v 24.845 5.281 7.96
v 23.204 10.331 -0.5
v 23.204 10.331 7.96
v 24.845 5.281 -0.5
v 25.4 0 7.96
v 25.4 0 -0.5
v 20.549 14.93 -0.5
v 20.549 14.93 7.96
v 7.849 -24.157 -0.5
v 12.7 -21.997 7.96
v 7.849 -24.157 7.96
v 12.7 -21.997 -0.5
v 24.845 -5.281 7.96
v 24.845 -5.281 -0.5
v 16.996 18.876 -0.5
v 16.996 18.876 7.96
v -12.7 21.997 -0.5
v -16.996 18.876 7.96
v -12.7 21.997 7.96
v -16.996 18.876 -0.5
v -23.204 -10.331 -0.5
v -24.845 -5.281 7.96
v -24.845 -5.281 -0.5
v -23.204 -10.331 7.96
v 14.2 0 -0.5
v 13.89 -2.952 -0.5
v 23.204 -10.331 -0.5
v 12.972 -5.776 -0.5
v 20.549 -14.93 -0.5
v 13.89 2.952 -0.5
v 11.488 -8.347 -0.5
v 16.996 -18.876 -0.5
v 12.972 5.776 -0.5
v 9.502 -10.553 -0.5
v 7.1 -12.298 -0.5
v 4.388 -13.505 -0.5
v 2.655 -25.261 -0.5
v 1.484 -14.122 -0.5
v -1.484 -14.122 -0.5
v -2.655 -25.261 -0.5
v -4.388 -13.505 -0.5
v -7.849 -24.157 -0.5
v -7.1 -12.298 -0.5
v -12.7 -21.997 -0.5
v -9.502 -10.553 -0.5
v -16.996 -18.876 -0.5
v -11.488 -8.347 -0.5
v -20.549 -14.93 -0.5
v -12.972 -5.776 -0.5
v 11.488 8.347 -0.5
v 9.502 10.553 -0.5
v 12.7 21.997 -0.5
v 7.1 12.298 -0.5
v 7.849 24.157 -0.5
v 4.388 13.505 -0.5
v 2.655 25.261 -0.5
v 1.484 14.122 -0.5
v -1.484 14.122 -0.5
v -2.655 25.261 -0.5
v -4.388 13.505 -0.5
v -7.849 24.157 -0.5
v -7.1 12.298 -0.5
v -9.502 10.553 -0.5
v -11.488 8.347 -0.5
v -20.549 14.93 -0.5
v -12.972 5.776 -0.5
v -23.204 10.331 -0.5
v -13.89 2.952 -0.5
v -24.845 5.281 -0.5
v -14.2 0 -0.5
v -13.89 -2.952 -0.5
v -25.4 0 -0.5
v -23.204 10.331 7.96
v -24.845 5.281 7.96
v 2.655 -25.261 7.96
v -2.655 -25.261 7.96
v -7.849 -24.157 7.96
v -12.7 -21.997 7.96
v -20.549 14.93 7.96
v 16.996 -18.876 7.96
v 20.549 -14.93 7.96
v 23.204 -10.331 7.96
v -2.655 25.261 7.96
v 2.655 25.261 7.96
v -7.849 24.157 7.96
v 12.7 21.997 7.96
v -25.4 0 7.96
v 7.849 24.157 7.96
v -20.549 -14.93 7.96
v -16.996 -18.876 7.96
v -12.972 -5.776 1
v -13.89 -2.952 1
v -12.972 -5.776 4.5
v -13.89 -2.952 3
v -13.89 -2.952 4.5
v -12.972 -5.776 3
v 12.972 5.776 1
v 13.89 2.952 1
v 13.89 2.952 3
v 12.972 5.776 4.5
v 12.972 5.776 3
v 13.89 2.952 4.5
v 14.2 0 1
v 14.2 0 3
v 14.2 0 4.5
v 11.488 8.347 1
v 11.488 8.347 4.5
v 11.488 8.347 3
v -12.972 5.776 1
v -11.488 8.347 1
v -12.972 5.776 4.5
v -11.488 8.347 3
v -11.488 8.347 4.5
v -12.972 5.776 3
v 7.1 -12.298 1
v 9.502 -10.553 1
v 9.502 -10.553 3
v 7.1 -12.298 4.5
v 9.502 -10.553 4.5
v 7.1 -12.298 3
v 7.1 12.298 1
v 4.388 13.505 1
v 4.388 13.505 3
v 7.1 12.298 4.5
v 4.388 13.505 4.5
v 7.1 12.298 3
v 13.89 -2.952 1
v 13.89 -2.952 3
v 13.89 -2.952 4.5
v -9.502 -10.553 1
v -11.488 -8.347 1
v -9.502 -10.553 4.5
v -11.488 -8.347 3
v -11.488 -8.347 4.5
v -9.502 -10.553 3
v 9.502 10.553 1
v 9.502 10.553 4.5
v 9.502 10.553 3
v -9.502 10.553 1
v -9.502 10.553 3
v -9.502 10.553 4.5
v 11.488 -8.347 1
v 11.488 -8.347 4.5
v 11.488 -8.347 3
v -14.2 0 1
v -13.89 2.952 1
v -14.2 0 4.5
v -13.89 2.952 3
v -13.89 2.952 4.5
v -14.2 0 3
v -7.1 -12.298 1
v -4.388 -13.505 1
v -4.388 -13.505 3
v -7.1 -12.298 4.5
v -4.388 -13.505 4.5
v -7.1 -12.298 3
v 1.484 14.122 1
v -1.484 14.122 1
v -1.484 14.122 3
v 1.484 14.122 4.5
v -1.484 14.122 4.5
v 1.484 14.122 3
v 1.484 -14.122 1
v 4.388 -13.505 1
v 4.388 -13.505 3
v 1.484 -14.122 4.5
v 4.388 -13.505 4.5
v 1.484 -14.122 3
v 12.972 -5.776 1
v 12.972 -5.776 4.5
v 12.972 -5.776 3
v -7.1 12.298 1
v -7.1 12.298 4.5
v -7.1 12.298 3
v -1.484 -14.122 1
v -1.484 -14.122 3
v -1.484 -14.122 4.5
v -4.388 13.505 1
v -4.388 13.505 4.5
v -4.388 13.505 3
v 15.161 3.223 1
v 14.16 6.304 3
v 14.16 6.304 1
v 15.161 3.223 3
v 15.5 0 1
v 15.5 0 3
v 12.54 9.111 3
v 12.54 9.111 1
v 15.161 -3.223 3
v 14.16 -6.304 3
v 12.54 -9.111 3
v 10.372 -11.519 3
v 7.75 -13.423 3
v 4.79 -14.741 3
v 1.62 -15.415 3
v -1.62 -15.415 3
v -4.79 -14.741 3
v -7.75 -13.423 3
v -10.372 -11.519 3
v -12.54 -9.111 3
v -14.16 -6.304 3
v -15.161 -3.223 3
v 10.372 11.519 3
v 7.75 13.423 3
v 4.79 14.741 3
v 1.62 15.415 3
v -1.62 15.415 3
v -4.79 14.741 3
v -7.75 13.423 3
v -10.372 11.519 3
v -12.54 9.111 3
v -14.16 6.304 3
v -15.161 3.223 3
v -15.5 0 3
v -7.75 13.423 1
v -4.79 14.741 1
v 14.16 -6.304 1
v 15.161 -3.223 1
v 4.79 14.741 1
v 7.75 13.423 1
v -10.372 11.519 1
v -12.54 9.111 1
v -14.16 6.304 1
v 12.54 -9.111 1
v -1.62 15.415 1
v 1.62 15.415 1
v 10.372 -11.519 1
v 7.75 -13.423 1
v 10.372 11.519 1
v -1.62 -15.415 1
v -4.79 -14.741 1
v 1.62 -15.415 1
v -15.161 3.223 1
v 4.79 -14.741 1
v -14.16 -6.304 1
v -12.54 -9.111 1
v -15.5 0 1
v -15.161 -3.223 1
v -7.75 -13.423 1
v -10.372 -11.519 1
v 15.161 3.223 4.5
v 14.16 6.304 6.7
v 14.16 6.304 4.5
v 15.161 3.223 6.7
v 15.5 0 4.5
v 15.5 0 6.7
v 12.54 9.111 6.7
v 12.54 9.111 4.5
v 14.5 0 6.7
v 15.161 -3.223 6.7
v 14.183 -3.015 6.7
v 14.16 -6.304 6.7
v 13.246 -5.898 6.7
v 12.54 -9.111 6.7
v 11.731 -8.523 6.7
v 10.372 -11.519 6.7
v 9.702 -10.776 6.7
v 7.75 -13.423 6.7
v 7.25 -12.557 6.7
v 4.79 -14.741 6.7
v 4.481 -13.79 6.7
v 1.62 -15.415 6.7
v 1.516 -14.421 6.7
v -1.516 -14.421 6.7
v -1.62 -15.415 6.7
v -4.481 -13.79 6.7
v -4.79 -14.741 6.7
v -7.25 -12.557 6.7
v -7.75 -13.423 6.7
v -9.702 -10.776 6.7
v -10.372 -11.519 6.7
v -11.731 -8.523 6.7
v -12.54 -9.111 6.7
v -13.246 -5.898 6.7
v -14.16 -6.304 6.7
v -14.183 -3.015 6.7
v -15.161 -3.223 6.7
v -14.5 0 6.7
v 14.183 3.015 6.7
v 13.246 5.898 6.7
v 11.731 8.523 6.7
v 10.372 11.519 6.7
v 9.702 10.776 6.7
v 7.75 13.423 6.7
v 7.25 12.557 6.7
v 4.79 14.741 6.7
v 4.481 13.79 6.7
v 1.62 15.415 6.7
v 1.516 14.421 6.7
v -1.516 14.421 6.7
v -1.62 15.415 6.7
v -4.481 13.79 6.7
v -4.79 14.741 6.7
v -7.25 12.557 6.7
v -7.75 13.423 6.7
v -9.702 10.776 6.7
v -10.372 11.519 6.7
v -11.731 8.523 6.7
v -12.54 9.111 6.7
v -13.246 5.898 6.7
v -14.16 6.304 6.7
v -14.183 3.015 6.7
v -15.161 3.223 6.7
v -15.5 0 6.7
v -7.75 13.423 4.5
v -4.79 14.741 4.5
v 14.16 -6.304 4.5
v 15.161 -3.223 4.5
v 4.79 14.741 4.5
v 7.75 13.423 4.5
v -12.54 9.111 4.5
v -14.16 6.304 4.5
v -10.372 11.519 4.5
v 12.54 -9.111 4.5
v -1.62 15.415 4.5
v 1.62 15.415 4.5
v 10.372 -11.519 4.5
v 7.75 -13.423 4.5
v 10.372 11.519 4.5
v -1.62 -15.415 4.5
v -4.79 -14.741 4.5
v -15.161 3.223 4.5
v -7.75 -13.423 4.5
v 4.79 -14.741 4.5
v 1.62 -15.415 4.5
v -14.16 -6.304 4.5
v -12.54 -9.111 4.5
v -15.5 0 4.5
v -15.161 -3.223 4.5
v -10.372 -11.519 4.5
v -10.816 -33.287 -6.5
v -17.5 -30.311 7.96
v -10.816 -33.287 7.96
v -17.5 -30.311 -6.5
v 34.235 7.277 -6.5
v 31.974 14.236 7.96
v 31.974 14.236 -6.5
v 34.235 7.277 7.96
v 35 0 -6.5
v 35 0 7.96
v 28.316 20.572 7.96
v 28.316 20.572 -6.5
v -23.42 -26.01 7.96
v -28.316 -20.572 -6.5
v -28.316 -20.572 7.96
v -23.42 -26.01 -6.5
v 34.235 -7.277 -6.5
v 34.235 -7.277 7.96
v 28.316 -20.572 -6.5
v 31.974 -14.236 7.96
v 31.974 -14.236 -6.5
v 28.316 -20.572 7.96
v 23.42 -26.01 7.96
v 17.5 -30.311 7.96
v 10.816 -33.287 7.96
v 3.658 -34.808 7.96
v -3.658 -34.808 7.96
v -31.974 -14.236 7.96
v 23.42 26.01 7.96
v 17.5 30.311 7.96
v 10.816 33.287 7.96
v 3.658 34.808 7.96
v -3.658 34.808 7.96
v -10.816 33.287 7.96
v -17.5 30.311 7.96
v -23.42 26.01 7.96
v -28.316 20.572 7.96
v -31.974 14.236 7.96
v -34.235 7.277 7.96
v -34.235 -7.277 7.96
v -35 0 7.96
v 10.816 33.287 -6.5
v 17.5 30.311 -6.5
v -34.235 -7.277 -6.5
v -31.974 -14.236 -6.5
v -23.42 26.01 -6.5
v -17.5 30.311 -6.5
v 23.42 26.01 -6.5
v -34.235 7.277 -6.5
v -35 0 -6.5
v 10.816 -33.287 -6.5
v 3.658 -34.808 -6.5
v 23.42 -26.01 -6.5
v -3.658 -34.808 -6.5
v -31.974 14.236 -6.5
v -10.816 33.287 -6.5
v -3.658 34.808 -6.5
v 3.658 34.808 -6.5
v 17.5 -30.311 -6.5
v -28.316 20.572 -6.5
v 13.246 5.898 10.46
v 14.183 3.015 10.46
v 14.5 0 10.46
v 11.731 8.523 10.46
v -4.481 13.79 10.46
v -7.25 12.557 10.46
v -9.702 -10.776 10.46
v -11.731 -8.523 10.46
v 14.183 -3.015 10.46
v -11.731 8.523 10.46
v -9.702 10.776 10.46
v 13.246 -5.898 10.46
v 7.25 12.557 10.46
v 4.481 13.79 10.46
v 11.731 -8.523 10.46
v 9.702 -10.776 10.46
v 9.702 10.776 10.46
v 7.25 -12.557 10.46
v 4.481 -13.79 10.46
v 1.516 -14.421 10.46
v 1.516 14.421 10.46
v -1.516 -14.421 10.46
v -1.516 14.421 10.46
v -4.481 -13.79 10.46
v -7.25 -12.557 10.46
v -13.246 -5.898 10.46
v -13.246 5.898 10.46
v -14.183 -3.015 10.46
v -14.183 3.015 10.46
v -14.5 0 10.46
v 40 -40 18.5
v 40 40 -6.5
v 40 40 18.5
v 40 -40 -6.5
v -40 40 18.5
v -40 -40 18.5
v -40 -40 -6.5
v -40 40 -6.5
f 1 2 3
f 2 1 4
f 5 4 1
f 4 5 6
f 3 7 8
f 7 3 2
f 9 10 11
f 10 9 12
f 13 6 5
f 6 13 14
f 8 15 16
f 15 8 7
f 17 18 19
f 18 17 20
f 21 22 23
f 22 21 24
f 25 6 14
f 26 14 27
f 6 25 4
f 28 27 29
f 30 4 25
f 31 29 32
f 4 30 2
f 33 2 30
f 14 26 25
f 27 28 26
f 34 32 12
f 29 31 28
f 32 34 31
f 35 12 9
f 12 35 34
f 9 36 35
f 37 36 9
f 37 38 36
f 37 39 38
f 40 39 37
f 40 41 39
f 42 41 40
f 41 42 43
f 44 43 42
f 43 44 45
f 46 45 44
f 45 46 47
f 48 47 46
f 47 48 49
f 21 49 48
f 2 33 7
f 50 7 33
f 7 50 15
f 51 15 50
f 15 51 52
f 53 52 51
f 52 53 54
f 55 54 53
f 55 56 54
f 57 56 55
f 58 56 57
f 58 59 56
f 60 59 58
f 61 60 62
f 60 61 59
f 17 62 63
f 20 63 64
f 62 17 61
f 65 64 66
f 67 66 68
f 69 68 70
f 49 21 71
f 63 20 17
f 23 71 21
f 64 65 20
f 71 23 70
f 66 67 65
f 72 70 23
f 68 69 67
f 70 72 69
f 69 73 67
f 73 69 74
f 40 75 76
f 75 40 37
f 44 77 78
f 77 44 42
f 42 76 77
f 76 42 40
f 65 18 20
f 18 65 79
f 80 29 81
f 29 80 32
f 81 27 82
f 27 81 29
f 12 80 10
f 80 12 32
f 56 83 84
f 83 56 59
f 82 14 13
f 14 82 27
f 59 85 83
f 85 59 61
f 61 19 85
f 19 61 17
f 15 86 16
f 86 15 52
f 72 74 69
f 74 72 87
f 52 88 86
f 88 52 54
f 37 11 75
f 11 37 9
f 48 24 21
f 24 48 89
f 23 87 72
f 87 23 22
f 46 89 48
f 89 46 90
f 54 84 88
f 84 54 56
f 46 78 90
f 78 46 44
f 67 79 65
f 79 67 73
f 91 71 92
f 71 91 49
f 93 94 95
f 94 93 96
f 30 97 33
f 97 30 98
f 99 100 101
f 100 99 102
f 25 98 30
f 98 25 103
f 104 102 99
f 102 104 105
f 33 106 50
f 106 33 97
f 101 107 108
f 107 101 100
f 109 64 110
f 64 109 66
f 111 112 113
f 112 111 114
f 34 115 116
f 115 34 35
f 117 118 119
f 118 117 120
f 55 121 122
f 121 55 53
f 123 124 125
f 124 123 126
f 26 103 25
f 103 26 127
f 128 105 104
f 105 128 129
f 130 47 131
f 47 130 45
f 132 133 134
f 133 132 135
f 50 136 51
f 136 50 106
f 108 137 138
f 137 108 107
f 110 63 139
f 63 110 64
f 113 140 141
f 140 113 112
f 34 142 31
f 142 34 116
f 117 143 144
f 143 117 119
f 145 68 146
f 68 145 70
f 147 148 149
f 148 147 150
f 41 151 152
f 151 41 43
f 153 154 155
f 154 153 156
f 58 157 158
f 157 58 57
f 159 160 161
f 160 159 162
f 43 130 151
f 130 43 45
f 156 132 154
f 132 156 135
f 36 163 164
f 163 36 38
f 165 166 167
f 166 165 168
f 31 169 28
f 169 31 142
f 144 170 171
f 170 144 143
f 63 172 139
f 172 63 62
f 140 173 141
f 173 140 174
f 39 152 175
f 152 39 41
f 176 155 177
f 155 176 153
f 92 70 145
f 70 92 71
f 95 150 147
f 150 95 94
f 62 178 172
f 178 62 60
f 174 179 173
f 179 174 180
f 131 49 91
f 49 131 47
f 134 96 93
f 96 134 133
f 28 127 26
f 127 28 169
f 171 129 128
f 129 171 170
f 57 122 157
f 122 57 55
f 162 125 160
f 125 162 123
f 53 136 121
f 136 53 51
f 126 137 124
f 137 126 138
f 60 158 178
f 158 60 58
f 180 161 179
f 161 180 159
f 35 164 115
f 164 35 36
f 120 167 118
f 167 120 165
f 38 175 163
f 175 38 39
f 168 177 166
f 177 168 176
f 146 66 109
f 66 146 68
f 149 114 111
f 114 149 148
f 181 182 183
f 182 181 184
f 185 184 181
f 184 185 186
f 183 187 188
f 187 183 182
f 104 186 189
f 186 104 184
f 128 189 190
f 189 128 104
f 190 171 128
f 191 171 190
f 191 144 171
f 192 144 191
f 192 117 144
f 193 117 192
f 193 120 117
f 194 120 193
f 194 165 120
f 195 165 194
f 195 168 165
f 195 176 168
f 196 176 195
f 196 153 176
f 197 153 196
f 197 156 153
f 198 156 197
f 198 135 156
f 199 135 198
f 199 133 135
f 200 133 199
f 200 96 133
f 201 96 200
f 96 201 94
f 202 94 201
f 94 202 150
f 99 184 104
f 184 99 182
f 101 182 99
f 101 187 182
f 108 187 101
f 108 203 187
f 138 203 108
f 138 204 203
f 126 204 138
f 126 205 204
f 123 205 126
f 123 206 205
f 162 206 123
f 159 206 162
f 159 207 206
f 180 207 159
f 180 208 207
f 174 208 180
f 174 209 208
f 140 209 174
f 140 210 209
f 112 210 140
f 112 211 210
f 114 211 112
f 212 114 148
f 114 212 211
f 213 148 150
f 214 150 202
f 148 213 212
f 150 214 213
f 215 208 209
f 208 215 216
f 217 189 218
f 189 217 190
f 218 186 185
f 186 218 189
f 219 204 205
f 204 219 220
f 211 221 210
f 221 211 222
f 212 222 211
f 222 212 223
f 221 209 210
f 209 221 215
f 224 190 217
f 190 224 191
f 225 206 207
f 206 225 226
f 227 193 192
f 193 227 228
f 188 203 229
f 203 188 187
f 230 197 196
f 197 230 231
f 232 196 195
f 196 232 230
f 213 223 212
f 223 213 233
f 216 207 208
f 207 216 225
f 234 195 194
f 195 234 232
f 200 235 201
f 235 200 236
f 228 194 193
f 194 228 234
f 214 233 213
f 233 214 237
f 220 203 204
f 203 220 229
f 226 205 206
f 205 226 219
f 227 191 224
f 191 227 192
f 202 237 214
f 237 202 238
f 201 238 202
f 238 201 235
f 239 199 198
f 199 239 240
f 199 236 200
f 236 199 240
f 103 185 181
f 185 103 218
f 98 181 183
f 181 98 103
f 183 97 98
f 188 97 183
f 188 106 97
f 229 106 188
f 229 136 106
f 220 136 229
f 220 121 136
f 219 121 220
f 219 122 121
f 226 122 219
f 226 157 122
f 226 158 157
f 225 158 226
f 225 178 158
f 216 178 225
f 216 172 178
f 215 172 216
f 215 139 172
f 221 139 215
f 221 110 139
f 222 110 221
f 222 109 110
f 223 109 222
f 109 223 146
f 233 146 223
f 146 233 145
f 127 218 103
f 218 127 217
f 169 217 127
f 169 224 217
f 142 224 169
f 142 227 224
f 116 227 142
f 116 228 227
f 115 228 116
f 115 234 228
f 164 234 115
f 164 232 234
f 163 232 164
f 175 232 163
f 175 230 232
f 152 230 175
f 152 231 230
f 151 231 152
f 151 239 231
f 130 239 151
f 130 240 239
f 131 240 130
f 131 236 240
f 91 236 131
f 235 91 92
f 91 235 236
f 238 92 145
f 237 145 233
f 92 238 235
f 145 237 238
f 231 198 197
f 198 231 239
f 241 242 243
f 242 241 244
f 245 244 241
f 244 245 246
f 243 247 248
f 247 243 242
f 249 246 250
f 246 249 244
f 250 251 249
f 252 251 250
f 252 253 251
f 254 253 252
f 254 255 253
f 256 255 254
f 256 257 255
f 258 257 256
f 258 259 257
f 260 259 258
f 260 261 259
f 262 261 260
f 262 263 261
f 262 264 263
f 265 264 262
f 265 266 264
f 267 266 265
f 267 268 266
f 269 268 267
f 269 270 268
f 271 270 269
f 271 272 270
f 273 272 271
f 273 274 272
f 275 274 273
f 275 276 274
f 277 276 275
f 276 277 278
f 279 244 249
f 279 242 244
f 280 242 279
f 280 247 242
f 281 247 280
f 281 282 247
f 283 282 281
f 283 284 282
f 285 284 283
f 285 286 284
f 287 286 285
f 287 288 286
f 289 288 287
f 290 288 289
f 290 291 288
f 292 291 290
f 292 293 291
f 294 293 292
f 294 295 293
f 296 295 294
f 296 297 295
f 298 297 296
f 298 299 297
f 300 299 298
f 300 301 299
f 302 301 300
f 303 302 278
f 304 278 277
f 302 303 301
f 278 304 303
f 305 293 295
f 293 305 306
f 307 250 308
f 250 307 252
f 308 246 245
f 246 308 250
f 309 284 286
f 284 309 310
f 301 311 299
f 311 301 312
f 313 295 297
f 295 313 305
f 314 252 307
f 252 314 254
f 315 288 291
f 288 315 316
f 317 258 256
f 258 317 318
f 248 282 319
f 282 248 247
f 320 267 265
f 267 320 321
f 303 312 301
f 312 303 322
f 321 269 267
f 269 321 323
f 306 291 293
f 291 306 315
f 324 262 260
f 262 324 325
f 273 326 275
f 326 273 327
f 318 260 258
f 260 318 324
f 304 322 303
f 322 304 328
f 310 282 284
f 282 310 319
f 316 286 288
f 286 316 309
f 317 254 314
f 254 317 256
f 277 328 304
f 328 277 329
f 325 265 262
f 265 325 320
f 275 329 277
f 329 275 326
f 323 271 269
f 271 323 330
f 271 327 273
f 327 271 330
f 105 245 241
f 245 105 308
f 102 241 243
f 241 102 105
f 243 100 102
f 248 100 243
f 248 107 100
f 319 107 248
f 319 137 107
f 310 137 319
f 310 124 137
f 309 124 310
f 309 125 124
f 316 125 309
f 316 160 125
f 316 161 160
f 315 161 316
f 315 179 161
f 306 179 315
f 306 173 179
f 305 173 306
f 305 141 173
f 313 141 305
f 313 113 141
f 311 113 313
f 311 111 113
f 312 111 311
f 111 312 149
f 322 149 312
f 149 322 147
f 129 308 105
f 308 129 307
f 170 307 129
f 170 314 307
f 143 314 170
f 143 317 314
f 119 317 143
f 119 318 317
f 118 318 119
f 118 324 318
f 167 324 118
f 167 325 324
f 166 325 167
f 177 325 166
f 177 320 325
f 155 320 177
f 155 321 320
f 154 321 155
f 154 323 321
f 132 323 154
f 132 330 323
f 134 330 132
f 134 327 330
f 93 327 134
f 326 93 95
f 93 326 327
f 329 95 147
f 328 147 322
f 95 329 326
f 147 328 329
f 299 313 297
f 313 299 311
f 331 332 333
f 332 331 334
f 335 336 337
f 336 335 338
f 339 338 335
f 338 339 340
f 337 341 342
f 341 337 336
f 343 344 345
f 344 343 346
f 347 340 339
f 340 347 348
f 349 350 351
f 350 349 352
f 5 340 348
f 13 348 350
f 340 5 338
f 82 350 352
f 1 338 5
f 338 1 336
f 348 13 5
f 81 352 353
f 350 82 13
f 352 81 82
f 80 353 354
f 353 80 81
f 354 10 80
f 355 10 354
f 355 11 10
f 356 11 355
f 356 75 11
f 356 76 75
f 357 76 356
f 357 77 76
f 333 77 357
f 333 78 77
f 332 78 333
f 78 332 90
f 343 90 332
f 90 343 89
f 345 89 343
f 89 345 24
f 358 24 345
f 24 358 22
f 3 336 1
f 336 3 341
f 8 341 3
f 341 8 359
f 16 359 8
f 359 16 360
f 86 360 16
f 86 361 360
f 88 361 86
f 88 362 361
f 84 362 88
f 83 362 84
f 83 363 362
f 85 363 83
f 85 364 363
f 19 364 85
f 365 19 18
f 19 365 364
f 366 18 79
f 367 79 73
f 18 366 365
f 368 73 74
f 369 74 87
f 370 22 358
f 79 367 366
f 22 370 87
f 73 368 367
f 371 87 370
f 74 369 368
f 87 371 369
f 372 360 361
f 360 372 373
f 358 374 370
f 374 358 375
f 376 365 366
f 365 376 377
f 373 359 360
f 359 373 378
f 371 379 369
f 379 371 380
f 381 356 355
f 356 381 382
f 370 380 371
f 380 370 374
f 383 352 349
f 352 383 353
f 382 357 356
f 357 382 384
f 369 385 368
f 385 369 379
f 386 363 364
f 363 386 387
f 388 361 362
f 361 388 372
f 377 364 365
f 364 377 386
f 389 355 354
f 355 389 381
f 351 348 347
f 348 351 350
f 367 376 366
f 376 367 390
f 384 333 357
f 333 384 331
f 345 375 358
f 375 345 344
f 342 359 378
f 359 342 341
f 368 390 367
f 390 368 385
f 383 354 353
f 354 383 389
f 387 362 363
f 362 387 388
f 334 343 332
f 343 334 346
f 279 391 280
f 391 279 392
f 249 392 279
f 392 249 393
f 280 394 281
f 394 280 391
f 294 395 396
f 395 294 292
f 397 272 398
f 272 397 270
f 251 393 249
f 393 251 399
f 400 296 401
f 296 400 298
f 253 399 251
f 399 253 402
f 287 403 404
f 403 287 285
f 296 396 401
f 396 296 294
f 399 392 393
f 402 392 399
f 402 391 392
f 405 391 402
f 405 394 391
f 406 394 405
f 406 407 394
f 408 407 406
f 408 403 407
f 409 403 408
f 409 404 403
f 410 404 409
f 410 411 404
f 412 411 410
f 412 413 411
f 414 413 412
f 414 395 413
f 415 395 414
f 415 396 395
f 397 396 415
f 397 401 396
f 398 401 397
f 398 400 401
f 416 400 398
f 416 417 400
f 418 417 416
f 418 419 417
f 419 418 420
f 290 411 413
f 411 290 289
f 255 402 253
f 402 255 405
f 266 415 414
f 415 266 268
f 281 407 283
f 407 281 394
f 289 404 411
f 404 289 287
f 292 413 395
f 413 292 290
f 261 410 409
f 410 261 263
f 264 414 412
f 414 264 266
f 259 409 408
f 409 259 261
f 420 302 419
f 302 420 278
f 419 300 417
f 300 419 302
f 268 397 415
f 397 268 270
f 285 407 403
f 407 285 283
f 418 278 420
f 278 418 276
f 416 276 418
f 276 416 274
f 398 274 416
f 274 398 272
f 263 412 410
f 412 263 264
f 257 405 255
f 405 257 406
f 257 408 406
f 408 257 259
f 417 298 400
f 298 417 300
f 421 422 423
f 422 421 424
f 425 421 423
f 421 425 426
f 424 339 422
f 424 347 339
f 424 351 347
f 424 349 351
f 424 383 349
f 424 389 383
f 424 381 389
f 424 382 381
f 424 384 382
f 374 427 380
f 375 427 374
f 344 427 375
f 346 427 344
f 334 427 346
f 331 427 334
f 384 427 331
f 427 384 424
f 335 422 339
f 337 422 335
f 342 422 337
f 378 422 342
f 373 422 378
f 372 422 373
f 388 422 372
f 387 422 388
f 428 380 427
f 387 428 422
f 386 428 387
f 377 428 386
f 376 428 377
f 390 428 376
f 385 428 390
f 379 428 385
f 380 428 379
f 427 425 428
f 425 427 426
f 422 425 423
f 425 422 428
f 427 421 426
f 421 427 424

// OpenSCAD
difference()
{
    translate([0,0,6]) {
        cube([80, 80, 25], center=true);
    }
    // thing being subtracted
    union() {
        difference()
        {
            difference()
            {
                cylinder(h=15.92, r1=35, r2=35, center=true);
                translate([0,0,14.5]) {
                    difference(){
                        difference()
                        {
                            cylinder(30, r1=25.4, r2=25.4, center=true);
                            cylinder(60, r1=14.2, r2=14.2, center=true);
                        }
                        translate([0,0,-12.5])
                            cylinder(2, r1=15.5, r2=15.5, center=true);
                        
                        translate([0,0,-8.9])
                            cylinder(2.2, r1=15.5, r2=15.5, center=true);
                        
                    }
                }
            }
        }
        // extend the r=14.5 hole 5mm above the r=30 cylinder top
        translate([0,0,5.46])
            cylinder(h=5, r=14.5);
    }
}
